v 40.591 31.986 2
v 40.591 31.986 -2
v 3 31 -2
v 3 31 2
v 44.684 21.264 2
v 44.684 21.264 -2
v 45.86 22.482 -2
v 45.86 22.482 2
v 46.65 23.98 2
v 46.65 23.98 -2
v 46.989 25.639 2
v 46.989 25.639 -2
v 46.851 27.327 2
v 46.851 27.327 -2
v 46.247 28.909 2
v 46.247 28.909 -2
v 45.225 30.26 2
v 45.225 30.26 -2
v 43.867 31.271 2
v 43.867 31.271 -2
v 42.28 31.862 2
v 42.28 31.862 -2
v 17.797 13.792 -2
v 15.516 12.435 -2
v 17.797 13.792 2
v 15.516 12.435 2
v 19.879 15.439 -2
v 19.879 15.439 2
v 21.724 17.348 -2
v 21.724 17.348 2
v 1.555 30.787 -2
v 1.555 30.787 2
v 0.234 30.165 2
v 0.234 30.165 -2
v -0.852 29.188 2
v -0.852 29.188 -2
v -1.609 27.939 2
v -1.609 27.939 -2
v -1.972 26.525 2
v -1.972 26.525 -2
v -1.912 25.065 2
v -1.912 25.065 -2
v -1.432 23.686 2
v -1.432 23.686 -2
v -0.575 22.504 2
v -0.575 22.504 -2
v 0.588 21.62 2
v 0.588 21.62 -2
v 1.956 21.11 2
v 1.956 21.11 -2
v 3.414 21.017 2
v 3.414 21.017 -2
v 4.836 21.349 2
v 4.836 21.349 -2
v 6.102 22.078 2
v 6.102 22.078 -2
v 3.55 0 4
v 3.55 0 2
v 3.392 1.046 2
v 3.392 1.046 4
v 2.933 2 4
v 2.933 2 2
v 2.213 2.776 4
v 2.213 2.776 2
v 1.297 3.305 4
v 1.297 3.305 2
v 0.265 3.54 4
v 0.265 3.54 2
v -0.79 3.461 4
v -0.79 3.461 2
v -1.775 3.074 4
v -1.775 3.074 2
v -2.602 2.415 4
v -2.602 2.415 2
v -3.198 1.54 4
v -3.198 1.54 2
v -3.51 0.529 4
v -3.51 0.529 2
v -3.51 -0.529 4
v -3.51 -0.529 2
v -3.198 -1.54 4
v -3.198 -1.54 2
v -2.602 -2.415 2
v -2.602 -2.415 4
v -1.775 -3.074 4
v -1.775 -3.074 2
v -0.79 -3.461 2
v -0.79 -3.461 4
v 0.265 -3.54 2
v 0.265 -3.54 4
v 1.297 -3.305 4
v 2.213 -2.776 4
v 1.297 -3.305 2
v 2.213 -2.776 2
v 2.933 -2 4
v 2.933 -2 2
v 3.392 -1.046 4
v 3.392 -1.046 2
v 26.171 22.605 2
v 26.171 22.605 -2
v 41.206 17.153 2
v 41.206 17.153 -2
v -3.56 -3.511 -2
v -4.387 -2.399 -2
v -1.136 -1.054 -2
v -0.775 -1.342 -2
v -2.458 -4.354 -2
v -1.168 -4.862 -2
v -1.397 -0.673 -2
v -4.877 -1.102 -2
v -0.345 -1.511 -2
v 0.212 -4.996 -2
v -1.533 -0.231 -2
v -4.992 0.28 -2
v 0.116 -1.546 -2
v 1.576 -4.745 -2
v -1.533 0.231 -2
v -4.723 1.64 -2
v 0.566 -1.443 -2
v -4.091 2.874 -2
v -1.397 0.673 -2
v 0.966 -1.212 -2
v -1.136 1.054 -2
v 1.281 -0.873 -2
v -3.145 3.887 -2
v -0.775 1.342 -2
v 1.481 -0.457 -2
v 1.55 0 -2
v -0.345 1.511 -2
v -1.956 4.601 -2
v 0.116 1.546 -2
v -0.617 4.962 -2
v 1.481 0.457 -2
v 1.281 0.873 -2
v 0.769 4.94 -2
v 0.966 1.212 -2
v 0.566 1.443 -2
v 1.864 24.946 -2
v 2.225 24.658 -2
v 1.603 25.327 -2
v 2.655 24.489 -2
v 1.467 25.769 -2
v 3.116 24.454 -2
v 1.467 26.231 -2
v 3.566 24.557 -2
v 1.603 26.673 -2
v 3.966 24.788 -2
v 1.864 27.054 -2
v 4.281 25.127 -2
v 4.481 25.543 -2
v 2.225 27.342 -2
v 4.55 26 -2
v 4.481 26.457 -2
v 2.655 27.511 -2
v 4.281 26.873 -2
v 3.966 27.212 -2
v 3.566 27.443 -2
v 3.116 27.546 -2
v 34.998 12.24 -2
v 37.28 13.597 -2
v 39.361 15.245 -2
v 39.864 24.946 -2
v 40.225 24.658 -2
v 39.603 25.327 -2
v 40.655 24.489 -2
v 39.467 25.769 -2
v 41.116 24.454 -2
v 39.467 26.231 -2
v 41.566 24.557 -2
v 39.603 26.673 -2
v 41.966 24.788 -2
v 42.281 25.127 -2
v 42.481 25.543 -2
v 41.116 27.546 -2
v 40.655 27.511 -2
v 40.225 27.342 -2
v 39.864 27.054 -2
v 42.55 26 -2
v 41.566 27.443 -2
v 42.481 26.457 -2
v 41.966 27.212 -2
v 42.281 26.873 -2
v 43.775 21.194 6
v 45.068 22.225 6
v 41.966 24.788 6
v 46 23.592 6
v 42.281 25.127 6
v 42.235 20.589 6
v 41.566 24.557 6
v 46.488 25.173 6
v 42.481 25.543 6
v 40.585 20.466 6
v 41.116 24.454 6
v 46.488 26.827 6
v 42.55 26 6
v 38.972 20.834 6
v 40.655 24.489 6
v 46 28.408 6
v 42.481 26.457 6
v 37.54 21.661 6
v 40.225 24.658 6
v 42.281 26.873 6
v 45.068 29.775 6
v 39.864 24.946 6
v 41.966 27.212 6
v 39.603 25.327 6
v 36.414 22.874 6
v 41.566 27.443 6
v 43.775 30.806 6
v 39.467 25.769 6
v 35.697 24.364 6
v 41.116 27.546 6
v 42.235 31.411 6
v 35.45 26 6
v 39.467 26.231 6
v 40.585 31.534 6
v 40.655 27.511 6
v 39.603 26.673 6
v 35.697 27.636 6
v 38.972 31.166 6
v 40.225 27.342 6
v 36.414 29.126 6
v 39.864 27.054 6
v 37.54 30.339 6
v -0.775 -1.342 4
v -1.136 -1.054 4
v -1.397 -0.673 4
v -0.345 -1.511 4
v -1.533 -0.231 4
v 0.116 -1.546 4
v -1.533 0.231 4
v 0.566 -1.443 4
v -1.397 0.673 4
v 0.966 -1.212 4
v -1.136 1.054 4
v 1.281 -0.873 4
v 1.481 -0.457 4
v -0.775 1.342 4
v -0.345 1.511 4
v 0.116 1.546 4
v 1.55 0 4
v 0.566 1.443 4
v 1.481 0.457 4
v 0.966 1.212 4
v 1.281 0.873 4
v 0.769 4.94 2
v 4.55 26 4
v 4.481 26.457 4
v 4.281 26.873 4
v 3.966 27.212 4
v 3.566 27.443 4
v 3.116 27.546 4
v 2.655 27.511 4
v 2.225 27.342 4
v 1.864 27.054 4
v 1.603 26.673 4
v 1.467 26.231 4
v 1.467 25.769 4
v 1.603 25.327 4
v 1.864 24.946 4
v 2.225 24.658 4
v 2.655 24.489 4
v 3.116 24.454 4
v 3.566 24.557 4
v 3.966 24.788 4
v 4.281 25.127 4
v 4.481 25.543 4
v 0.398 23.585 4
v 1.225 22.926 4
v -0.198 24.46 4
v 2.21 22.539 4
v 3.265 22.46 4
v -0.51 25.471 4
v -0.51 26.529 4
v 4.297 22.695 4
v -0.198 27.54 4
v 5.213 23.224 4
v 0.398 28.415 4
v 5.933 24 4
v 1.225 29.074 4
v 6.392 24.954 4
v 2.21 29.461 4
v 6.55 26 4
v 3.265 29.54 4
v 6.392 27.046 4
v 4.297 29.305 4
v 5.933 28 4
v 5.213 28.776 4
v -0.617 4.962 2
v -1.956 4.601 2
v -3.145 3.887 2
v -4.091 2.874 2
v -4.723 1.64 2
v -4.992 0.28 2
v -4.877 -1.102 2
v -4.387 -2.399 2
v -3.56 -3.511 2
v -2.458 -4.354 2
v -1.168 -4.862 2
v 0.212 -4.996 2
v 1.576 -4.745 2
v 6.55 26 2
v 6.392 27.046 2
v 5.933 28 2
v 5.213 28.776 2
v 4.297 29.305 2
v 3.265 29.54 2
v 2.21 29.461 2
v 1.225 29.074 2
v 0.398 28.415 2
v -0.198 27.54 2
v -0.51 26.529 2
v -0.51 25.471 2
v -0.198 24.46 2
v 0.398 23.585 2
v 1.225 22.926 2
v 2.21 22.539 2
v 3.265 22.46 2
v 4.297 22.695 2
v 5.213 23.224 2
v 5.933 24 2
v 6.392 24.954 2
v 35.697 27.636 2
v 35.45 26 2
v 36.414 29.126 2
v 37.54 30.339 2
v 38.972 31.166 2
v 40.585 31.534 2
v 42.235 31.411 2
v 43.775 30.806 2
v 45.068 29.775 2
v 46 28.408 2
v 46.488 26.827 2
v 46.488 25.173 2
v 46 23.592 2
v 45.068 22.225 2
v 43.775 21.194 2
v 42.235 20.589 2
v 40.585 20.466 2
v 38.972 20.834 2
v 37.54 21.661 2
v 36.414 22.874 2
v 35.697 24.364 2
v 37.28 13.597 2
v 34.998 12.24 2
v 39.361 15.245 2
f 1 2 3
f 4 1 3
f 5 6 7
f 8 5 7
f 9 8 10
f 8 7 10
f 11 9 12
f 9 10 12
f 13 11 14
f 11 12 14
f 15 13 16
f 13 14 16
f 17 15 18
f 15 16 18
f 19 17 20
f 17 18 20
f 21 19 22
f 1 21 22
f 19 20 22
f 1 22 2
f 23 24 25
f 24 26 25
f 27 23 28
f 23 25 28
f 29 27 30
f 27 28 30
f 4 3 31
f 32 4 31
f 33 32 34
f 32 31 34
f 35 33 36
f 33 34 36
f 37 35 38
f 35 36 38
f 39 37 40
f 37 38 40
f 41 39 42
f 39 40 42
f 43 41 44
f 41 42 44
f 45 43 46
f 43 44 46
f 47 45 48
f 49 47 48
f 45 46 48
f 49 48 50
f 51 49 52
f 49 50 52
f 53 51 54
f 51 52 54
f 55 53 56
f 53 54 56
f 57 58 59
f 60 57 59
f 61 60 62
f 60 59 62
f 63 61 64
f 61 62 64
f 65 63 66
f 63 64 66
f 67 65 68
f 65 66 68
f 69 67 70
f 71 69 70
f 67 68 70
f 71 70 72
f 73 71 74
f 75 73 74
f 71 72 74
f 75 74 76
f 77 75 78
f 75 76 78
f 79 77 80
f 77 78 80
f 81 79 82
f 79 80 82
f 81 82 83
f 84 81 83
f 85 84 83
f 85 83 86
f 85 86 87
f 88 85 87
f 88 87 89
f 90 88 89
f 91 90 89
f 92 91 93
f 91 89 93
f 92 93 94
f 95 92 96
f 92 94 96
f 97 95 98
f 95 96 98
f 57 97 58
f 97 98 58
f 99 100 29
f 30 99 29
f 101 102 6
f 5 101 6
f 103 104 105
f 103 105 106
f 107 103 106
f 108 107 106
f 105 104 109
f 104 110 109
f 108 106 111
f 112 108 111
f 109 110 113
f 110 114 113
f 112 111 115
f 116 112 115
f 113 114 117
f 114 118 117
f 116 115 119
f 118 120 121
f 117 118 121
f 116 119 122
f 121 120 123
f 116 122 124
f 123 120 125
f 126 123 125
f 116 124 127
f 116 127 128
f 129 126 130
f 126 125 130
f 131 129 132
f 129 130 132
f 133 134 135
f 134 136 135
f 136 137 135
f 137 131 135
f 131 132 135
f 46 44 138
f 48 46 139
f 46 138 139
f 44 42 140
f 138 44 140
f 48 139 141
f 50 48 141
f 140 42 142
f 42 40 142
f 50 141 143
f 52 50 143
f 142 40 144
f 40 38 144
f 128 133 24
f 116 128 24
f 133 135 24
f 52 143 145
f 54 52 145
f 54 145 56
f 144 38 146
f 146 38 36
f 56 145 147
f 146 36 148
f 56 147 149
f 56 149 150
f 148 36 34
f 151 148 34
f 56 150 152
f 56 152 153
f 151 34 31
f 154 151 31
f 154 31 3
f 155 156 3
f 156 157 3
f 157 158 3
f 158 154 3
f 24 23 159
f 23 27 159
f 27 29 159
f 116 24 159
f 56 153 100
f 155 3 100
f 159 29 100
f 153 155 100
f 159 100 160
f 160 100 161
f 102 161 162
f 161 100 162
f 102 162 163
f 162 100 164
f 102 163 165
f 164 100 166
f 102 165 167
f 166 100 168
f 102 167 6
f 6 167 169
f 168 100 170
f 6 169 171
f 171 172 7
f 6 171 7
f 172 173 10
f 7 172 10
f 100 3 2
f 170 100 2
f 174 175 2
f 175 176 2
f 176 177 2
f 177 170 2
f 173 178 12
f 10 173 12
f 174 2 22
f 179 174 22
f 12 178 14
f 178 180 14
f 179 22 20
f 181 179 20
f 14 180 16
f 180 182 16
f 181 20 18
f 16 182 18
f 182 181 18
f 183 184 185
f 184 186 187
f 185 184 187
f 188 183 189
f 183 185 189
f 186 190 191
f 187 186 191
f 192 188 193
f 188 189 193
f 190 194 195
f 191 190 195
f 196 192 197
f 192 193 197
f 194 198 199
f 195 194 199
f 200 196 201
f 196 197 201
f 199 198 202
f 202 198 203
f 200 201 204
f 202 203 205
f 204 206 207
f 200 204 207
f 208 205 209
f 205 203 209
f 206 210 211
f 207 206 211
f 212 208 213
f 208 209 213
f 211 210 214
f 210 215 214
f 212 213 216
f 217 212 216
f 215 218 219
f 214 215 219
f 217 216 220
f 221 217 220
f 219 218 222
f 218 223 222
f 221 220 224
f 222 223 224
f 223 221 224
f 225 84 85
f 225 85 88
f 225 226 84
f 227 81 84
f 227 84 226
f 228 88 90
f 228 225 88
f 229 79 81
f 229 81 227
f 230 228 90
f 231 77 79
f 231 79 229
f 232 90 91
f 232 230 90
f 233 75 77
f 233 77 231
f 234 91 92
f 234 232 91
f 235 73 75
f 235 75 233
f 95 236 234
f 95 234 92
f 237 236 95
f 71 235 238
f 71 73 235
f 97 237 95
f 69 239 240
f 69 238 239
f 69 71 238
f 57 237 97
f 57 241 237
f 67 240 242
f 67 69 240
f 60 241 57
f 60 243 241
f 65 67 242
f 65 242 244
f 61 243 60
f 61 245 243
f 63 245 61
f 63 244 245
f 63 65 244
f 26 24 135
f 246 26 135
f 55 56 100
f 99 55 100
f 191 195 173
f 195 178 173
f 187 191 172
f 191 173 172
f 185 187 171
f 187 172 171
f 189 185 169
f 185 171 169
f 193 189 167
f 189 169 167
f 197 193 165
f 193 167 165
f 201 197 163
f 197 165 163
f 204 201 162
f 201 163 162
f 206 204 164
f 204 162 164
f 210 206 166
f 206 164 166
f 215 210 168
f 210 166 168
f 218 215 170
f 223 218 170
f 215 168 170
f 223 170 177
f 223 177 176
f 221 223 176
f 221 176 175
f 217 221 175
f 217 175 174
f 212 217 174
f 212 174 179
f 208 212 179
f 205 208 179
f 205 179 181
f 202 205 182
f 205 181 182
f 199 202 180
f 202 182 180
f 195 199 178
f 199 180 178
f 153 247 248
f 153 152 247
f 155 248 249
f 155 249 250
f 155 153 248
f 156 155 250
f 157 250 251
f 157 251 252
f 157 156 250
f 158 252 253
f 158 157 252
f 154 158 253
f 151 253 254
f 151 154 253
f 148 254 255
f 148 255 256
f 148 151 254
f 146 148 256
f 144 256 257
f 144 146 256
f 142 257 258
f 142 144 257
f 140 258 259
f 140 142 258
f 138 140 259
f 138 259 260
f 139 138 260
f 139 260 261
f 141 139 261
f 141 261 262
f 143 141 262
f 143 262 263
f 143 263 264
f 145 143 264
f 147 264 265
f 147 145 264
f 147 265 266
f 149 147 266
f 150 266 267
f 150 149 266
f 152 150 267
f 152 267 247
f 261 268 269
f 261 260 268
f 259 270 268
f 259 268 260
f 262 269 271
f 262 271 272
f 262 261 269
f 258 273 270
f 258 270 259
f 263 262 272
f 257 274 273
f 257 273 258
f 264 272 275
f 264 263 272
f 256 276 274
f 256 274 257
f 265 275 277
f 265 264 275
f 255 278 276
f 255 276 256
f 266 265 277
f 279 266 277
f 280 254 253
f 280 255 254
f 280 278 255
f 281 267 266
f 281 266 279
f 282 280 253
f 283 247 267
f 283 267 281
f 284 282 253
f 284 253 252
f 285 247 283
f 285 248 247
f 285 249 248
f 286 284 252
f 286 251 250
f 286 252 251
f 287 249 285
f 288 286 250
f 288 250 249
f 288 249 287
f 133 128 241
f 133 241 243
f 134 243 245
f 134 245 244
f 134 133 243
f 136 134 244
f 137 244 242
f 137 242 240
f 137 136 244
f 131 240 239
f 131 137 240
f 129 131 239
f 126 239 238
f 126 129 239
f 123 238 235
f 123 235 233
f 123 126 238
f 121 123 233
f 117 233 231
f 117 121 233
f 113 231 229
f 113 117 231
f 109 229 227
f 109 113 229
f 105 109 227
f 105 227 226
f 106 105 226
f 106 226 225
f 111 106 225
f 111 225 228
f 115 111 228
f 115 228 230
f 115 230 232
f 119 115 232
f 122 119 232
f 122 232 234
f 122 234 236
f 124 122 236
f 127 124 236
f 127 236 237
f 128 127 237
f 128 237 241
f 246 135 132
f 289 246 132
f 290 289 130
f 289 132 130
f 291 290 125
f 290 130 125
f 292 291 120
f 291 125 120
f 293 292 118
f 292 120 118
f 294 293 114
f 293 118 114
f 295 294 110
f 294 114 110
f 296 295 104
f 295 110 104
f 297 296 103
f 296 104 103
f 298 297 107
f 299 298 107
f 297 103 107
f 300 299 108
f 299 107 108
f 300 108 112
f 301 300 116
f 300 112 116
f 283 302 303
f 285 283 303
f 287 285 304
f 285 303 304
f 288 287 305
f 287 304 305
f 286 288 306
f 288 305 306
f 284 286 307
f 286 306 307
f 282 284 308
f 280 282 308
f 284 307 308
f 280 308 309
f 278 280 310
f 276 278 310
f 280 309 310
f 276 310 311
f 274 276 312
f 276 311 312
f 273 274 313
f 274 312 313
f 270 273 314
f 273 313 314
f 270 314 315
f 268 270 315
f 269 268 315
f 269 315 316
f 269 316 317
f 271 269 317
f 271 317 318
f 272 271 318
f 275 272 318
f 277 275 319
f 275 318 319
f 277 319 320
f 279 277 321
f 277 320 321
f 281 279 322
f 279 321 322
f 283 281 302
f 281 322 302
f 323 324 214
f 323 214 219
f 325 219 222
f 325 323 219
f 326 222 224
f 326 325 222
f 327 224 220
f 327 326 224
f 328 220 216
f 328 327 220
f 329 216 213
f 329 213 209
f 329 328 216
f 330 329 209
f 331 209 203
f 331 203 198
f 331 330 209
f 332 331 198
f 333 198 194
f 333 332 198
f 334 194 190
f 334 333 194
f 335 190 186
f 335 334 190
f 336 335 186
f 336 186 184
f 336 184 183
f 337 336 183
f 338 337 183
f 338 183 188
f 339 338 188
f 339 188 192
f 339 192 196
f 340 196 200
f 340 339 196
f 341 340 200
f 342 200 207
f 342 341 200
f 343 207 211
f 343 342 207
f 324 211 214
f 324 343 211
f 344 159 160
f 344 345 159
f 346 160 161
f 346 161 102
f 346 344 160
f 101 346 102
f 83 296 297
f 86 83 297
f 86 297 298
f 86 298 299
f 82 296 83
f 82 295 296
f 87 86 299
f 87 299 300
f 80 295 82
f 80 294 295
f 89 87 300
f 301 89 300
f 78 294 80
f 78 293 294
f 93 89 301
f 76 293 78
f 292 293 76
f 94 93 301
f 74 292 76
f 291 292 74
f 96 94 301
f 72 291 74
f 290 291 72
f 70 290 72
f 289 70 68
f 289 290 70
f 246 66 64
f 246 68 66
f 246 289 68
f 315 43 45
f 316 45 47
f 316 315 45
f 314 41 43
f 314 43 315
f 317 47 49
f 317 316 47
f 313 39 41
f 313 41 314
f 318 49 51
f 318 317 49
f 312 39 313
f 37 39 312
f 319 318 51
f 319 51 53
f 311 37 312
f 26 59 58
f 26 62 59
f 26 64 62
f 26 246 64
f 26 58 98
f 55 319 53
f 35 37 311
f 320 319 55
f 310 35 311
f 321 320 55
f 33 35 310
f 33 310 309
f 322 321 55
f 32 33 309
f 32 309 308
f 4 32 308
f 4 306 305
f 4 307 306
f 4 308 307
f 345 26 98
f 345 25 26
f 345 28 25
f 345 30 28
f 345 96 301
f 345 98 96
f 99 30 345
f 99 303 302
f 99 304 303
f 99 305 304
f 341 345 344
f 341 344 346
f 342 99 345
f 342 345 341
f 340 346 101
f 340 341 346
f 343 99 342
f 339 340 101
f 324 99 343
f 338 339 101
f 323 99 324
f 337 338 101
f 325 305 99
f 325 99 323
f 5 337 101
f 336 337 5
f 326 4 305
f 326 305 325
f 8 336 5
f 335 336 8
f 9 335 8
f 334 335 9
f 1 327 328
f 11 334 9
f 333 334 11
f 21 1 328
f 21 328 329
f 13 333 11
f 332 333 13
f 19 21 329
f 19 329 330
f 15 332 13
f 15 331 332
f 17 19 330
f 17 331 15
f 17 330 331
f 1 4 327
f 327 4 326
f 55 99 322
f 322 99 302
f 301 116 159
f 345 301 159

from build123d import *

# Parameters (mm, degrees)
BOSS_EXTRUDE1_DEPTH      = 2
BOSS_EXTRUDE1_DEPTH_BACK = 2
SKETCH2_R                = 1.55
FILLET1_R                = 20
SKETCH7_R                = 5.55
SKETCH7_R_2              = 1.55
BOSS_EXTRUDE4_DEPTH      = 4
SKETCH8_R                = 3.55
SKETCH8_R_2              = 1.55
BOSS_EXTRUDE5_DEPTH      = 2


with BuildPart() as part:
    # Sketch2 → Boss-Extrude1 (new, two sides: drawn at the far end of the back side and taken through both)
    with BuildSketch(Plane.XY.offset(-BOSS_EXTRUDE1_DEPTH_BACK)):
        with BuildLine():
            ThreePointArc((0.76923556, 4.940473323), (-4.982755324, -0.41490888), (1.575752274, -4.745208612))
            Line((1.575752274, -4.745208612), (38.598254294, 14.069940073))
            Line((38.598254294, 14.069940073), (44.683748534, 21.26396825))
            ThreePointArc((44.683748534, 21.26396825), (46.605489471, 28.139740122), (40.590896347, 31.986036602))
            Line((40.590896347, 31.986036602), (3, 31))
            ThreePointArc((3, 31), (-1.722747684, 24.35815521), (6.101607472, 22.078261726))
            Line((6.101607472, 22.078261726), (26.170960727, 22.604695486))
            Line((26.170960727, 22.604695486), (19.115779569, 14.264342174))
            Line((19.115779569, 14.264342174), (0.76923556, 4.940473323))
        make_face()
        Circle(SKETCH2_R, mode=Mode.SUBTRACT)
        with Locations((3, 26)):
            Circle(SKETCH2_R, mode=Mode.SUBTRACT)
        with Locations((41, 26)):
            Circle(SKETCH2_R, mode=Mode.SUBTRACT)
    extrude(amount=BOSS_EXTRUDE1_DEPTH + BOSS_EXTRUDE1_DEPTH_BACK)

    # Fillet1
    fillet1_edges = [part.edges().sort_by_distance(p)[0] for p in [
        (38.598254294, 14.069940073, 0),
        (19.115779569, 14.264342174, 0),
    ]]
    fillet(fillet1_edges, radius=FILLET1_R)

    # Sketch7 → Boss-Extrude4 (add)
    with BuildSketch(Plane(origin=(0, 0, 2), x_dir=(-1, 0, 0), z_dir=(0, 0, -1))):
        with Locations((-41, 26)):
            Circle(SKETCH7_R)
        with Locations((-41, 26)):
            Circle(SKETCH7_R_2, mode=Mode.SUBTRACT)
    extrude(amount=-BOSS_EXTRUDE4_DEPTH)

    # Sketch8 → Boss-Extrude5 (add)
    # profile 1 of 2: a face of its own
    with BuildSketch(Plane.XY.offset(2)):
        with Locations((3, 26)):
            Circle(SKETCH8_R)
        with Locations((3, 26)):
            Circle(SKETCH8_R_2, mode=Mode.SUBTRACT)
    # profile 2 of 2: a face of its own
    with BuildSketch(Plane.XY.offset(2)):
        Circle(SKETCH8_R)
        Circle(SKETCH8_R_2, mode=Mode.SUBTRACT)
    extrude(amount=BOSS_EXTRUDE5_DEPTH)


solid = part.part
